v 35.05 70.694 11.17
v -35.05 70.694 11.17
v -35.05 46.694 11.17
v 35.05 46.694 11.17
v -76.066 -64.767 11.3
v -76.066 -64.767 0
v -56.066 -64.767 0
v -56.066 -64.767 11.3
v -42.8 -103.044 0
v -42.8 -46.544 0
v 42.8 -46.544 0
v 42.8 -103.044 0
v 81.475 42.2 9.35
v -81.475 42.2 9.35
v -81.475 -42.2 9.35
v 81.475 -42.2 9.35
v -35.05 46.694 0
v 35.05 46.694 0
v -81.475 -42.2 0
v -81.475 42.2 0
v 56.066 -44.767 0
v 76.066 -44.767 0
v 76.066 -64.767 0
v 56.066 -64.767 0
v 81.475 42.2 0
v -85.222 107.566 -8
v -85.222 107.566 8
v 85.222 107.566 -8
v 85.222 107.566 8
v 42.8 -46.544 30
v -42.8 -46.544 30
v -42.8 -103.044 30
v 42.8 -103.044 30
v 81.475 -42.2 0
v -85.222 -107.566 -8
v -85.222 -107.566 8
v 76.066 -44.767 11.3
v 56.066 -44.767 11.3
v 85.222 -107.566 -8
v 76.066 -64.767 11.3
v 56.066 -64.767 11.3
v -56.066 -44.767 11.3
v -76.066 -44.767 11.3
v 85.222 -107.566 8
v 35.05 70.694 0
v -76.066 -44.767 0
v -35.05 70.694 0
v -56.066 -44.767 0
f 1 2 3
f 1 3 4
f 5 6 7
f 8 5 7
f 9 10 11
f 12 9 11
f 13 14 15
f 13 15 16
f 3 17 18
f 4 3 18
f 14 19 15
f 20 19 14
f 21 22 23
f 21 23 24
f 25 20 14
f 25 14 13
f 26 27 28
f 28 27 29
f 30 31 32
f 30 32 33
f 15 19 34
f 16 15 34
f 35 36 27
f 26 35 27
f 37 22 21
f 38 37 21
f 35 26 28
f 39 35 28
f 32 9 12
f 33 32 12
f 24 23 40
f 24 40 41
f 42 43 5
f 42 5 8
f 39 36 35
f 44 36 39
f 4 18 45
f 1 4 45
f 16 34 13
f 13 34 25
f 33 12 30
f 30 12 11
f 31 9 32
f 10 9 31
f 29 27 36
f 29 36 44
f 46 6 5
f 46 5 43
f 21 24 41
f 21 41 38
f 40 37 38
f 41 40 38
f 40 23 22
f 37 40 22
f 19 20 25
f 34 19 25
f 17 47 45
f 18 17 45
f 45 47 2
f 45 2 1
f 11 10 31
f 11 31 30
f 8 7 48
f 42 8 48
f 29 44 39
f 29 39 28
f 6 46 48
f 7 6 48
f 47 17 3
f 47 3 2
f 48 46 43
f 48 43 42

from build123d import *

# Parameters (mm, degrees)
F0_W      = 162.95
F0_H      = 84.4
F3_DEPTH  = 9.35
F1_W      = 20
F1_H      = 20
F4_DEPTH  = 11.3
F2_W      = 70.1
F2_H      = 24
F5_DEPTH  = 11.17
F7_W      = 85.6
F7_H      = 56.5
F8_DEPTH  = 30
F9_W      = 170.443266
F9_H      = 215.131148
F10_DEPTH = 8


with BuildPart() as f3:
    # F0 (on Top) → F3 (new body)
    with BuildSketch(Plane.XY):
        Rectangle(F0_W, F0_H)
    extrude(amount=F3_DEPTH)


with BuildPart() as f4:
    # F1 (on Top) → F4 (new body)
    with BuildSketch(Plane.XY):
        with Locations((-66.065835, -54.767472)):
            Rectangle(F1_W, F1_H)
    extrude(amount=F4_DEPTH)


with BuildPart() as f5:
    # F2 (on Top) → F5 (new body)
    with BuildSketch(Plane.XY):
        with Locations((0, 58.693662)):
            Rectangle(F2_W, F2_H)
    extrude(amount=F5_DEPTH)


with BuildPart() as f6_1:
    # F6: instance of F4
    add(f4.part.mirror(Plane.YZ))


with BuildPart() as f8:
    # F7 (on Top) → F8 (new body)
    with BuildSketch(Plane.XY):
        with Locations((0, -74.794173)):
            Rectangle(F7_W, F7_H)
    extrude(amount=F8_DEPTH)


with BuildPart() as f10:
    # F9 (on Top) → F10 (new body, symmetric)
    with BuildSketch(Plane.XY):
        Rectangle(F9_W, F9_H)
    extrude(amount=F10_DEPTH, both=True)


solid = Compound([f3.part, f4.part, f5.part, f6_1.part, f8.part, f10.part])
